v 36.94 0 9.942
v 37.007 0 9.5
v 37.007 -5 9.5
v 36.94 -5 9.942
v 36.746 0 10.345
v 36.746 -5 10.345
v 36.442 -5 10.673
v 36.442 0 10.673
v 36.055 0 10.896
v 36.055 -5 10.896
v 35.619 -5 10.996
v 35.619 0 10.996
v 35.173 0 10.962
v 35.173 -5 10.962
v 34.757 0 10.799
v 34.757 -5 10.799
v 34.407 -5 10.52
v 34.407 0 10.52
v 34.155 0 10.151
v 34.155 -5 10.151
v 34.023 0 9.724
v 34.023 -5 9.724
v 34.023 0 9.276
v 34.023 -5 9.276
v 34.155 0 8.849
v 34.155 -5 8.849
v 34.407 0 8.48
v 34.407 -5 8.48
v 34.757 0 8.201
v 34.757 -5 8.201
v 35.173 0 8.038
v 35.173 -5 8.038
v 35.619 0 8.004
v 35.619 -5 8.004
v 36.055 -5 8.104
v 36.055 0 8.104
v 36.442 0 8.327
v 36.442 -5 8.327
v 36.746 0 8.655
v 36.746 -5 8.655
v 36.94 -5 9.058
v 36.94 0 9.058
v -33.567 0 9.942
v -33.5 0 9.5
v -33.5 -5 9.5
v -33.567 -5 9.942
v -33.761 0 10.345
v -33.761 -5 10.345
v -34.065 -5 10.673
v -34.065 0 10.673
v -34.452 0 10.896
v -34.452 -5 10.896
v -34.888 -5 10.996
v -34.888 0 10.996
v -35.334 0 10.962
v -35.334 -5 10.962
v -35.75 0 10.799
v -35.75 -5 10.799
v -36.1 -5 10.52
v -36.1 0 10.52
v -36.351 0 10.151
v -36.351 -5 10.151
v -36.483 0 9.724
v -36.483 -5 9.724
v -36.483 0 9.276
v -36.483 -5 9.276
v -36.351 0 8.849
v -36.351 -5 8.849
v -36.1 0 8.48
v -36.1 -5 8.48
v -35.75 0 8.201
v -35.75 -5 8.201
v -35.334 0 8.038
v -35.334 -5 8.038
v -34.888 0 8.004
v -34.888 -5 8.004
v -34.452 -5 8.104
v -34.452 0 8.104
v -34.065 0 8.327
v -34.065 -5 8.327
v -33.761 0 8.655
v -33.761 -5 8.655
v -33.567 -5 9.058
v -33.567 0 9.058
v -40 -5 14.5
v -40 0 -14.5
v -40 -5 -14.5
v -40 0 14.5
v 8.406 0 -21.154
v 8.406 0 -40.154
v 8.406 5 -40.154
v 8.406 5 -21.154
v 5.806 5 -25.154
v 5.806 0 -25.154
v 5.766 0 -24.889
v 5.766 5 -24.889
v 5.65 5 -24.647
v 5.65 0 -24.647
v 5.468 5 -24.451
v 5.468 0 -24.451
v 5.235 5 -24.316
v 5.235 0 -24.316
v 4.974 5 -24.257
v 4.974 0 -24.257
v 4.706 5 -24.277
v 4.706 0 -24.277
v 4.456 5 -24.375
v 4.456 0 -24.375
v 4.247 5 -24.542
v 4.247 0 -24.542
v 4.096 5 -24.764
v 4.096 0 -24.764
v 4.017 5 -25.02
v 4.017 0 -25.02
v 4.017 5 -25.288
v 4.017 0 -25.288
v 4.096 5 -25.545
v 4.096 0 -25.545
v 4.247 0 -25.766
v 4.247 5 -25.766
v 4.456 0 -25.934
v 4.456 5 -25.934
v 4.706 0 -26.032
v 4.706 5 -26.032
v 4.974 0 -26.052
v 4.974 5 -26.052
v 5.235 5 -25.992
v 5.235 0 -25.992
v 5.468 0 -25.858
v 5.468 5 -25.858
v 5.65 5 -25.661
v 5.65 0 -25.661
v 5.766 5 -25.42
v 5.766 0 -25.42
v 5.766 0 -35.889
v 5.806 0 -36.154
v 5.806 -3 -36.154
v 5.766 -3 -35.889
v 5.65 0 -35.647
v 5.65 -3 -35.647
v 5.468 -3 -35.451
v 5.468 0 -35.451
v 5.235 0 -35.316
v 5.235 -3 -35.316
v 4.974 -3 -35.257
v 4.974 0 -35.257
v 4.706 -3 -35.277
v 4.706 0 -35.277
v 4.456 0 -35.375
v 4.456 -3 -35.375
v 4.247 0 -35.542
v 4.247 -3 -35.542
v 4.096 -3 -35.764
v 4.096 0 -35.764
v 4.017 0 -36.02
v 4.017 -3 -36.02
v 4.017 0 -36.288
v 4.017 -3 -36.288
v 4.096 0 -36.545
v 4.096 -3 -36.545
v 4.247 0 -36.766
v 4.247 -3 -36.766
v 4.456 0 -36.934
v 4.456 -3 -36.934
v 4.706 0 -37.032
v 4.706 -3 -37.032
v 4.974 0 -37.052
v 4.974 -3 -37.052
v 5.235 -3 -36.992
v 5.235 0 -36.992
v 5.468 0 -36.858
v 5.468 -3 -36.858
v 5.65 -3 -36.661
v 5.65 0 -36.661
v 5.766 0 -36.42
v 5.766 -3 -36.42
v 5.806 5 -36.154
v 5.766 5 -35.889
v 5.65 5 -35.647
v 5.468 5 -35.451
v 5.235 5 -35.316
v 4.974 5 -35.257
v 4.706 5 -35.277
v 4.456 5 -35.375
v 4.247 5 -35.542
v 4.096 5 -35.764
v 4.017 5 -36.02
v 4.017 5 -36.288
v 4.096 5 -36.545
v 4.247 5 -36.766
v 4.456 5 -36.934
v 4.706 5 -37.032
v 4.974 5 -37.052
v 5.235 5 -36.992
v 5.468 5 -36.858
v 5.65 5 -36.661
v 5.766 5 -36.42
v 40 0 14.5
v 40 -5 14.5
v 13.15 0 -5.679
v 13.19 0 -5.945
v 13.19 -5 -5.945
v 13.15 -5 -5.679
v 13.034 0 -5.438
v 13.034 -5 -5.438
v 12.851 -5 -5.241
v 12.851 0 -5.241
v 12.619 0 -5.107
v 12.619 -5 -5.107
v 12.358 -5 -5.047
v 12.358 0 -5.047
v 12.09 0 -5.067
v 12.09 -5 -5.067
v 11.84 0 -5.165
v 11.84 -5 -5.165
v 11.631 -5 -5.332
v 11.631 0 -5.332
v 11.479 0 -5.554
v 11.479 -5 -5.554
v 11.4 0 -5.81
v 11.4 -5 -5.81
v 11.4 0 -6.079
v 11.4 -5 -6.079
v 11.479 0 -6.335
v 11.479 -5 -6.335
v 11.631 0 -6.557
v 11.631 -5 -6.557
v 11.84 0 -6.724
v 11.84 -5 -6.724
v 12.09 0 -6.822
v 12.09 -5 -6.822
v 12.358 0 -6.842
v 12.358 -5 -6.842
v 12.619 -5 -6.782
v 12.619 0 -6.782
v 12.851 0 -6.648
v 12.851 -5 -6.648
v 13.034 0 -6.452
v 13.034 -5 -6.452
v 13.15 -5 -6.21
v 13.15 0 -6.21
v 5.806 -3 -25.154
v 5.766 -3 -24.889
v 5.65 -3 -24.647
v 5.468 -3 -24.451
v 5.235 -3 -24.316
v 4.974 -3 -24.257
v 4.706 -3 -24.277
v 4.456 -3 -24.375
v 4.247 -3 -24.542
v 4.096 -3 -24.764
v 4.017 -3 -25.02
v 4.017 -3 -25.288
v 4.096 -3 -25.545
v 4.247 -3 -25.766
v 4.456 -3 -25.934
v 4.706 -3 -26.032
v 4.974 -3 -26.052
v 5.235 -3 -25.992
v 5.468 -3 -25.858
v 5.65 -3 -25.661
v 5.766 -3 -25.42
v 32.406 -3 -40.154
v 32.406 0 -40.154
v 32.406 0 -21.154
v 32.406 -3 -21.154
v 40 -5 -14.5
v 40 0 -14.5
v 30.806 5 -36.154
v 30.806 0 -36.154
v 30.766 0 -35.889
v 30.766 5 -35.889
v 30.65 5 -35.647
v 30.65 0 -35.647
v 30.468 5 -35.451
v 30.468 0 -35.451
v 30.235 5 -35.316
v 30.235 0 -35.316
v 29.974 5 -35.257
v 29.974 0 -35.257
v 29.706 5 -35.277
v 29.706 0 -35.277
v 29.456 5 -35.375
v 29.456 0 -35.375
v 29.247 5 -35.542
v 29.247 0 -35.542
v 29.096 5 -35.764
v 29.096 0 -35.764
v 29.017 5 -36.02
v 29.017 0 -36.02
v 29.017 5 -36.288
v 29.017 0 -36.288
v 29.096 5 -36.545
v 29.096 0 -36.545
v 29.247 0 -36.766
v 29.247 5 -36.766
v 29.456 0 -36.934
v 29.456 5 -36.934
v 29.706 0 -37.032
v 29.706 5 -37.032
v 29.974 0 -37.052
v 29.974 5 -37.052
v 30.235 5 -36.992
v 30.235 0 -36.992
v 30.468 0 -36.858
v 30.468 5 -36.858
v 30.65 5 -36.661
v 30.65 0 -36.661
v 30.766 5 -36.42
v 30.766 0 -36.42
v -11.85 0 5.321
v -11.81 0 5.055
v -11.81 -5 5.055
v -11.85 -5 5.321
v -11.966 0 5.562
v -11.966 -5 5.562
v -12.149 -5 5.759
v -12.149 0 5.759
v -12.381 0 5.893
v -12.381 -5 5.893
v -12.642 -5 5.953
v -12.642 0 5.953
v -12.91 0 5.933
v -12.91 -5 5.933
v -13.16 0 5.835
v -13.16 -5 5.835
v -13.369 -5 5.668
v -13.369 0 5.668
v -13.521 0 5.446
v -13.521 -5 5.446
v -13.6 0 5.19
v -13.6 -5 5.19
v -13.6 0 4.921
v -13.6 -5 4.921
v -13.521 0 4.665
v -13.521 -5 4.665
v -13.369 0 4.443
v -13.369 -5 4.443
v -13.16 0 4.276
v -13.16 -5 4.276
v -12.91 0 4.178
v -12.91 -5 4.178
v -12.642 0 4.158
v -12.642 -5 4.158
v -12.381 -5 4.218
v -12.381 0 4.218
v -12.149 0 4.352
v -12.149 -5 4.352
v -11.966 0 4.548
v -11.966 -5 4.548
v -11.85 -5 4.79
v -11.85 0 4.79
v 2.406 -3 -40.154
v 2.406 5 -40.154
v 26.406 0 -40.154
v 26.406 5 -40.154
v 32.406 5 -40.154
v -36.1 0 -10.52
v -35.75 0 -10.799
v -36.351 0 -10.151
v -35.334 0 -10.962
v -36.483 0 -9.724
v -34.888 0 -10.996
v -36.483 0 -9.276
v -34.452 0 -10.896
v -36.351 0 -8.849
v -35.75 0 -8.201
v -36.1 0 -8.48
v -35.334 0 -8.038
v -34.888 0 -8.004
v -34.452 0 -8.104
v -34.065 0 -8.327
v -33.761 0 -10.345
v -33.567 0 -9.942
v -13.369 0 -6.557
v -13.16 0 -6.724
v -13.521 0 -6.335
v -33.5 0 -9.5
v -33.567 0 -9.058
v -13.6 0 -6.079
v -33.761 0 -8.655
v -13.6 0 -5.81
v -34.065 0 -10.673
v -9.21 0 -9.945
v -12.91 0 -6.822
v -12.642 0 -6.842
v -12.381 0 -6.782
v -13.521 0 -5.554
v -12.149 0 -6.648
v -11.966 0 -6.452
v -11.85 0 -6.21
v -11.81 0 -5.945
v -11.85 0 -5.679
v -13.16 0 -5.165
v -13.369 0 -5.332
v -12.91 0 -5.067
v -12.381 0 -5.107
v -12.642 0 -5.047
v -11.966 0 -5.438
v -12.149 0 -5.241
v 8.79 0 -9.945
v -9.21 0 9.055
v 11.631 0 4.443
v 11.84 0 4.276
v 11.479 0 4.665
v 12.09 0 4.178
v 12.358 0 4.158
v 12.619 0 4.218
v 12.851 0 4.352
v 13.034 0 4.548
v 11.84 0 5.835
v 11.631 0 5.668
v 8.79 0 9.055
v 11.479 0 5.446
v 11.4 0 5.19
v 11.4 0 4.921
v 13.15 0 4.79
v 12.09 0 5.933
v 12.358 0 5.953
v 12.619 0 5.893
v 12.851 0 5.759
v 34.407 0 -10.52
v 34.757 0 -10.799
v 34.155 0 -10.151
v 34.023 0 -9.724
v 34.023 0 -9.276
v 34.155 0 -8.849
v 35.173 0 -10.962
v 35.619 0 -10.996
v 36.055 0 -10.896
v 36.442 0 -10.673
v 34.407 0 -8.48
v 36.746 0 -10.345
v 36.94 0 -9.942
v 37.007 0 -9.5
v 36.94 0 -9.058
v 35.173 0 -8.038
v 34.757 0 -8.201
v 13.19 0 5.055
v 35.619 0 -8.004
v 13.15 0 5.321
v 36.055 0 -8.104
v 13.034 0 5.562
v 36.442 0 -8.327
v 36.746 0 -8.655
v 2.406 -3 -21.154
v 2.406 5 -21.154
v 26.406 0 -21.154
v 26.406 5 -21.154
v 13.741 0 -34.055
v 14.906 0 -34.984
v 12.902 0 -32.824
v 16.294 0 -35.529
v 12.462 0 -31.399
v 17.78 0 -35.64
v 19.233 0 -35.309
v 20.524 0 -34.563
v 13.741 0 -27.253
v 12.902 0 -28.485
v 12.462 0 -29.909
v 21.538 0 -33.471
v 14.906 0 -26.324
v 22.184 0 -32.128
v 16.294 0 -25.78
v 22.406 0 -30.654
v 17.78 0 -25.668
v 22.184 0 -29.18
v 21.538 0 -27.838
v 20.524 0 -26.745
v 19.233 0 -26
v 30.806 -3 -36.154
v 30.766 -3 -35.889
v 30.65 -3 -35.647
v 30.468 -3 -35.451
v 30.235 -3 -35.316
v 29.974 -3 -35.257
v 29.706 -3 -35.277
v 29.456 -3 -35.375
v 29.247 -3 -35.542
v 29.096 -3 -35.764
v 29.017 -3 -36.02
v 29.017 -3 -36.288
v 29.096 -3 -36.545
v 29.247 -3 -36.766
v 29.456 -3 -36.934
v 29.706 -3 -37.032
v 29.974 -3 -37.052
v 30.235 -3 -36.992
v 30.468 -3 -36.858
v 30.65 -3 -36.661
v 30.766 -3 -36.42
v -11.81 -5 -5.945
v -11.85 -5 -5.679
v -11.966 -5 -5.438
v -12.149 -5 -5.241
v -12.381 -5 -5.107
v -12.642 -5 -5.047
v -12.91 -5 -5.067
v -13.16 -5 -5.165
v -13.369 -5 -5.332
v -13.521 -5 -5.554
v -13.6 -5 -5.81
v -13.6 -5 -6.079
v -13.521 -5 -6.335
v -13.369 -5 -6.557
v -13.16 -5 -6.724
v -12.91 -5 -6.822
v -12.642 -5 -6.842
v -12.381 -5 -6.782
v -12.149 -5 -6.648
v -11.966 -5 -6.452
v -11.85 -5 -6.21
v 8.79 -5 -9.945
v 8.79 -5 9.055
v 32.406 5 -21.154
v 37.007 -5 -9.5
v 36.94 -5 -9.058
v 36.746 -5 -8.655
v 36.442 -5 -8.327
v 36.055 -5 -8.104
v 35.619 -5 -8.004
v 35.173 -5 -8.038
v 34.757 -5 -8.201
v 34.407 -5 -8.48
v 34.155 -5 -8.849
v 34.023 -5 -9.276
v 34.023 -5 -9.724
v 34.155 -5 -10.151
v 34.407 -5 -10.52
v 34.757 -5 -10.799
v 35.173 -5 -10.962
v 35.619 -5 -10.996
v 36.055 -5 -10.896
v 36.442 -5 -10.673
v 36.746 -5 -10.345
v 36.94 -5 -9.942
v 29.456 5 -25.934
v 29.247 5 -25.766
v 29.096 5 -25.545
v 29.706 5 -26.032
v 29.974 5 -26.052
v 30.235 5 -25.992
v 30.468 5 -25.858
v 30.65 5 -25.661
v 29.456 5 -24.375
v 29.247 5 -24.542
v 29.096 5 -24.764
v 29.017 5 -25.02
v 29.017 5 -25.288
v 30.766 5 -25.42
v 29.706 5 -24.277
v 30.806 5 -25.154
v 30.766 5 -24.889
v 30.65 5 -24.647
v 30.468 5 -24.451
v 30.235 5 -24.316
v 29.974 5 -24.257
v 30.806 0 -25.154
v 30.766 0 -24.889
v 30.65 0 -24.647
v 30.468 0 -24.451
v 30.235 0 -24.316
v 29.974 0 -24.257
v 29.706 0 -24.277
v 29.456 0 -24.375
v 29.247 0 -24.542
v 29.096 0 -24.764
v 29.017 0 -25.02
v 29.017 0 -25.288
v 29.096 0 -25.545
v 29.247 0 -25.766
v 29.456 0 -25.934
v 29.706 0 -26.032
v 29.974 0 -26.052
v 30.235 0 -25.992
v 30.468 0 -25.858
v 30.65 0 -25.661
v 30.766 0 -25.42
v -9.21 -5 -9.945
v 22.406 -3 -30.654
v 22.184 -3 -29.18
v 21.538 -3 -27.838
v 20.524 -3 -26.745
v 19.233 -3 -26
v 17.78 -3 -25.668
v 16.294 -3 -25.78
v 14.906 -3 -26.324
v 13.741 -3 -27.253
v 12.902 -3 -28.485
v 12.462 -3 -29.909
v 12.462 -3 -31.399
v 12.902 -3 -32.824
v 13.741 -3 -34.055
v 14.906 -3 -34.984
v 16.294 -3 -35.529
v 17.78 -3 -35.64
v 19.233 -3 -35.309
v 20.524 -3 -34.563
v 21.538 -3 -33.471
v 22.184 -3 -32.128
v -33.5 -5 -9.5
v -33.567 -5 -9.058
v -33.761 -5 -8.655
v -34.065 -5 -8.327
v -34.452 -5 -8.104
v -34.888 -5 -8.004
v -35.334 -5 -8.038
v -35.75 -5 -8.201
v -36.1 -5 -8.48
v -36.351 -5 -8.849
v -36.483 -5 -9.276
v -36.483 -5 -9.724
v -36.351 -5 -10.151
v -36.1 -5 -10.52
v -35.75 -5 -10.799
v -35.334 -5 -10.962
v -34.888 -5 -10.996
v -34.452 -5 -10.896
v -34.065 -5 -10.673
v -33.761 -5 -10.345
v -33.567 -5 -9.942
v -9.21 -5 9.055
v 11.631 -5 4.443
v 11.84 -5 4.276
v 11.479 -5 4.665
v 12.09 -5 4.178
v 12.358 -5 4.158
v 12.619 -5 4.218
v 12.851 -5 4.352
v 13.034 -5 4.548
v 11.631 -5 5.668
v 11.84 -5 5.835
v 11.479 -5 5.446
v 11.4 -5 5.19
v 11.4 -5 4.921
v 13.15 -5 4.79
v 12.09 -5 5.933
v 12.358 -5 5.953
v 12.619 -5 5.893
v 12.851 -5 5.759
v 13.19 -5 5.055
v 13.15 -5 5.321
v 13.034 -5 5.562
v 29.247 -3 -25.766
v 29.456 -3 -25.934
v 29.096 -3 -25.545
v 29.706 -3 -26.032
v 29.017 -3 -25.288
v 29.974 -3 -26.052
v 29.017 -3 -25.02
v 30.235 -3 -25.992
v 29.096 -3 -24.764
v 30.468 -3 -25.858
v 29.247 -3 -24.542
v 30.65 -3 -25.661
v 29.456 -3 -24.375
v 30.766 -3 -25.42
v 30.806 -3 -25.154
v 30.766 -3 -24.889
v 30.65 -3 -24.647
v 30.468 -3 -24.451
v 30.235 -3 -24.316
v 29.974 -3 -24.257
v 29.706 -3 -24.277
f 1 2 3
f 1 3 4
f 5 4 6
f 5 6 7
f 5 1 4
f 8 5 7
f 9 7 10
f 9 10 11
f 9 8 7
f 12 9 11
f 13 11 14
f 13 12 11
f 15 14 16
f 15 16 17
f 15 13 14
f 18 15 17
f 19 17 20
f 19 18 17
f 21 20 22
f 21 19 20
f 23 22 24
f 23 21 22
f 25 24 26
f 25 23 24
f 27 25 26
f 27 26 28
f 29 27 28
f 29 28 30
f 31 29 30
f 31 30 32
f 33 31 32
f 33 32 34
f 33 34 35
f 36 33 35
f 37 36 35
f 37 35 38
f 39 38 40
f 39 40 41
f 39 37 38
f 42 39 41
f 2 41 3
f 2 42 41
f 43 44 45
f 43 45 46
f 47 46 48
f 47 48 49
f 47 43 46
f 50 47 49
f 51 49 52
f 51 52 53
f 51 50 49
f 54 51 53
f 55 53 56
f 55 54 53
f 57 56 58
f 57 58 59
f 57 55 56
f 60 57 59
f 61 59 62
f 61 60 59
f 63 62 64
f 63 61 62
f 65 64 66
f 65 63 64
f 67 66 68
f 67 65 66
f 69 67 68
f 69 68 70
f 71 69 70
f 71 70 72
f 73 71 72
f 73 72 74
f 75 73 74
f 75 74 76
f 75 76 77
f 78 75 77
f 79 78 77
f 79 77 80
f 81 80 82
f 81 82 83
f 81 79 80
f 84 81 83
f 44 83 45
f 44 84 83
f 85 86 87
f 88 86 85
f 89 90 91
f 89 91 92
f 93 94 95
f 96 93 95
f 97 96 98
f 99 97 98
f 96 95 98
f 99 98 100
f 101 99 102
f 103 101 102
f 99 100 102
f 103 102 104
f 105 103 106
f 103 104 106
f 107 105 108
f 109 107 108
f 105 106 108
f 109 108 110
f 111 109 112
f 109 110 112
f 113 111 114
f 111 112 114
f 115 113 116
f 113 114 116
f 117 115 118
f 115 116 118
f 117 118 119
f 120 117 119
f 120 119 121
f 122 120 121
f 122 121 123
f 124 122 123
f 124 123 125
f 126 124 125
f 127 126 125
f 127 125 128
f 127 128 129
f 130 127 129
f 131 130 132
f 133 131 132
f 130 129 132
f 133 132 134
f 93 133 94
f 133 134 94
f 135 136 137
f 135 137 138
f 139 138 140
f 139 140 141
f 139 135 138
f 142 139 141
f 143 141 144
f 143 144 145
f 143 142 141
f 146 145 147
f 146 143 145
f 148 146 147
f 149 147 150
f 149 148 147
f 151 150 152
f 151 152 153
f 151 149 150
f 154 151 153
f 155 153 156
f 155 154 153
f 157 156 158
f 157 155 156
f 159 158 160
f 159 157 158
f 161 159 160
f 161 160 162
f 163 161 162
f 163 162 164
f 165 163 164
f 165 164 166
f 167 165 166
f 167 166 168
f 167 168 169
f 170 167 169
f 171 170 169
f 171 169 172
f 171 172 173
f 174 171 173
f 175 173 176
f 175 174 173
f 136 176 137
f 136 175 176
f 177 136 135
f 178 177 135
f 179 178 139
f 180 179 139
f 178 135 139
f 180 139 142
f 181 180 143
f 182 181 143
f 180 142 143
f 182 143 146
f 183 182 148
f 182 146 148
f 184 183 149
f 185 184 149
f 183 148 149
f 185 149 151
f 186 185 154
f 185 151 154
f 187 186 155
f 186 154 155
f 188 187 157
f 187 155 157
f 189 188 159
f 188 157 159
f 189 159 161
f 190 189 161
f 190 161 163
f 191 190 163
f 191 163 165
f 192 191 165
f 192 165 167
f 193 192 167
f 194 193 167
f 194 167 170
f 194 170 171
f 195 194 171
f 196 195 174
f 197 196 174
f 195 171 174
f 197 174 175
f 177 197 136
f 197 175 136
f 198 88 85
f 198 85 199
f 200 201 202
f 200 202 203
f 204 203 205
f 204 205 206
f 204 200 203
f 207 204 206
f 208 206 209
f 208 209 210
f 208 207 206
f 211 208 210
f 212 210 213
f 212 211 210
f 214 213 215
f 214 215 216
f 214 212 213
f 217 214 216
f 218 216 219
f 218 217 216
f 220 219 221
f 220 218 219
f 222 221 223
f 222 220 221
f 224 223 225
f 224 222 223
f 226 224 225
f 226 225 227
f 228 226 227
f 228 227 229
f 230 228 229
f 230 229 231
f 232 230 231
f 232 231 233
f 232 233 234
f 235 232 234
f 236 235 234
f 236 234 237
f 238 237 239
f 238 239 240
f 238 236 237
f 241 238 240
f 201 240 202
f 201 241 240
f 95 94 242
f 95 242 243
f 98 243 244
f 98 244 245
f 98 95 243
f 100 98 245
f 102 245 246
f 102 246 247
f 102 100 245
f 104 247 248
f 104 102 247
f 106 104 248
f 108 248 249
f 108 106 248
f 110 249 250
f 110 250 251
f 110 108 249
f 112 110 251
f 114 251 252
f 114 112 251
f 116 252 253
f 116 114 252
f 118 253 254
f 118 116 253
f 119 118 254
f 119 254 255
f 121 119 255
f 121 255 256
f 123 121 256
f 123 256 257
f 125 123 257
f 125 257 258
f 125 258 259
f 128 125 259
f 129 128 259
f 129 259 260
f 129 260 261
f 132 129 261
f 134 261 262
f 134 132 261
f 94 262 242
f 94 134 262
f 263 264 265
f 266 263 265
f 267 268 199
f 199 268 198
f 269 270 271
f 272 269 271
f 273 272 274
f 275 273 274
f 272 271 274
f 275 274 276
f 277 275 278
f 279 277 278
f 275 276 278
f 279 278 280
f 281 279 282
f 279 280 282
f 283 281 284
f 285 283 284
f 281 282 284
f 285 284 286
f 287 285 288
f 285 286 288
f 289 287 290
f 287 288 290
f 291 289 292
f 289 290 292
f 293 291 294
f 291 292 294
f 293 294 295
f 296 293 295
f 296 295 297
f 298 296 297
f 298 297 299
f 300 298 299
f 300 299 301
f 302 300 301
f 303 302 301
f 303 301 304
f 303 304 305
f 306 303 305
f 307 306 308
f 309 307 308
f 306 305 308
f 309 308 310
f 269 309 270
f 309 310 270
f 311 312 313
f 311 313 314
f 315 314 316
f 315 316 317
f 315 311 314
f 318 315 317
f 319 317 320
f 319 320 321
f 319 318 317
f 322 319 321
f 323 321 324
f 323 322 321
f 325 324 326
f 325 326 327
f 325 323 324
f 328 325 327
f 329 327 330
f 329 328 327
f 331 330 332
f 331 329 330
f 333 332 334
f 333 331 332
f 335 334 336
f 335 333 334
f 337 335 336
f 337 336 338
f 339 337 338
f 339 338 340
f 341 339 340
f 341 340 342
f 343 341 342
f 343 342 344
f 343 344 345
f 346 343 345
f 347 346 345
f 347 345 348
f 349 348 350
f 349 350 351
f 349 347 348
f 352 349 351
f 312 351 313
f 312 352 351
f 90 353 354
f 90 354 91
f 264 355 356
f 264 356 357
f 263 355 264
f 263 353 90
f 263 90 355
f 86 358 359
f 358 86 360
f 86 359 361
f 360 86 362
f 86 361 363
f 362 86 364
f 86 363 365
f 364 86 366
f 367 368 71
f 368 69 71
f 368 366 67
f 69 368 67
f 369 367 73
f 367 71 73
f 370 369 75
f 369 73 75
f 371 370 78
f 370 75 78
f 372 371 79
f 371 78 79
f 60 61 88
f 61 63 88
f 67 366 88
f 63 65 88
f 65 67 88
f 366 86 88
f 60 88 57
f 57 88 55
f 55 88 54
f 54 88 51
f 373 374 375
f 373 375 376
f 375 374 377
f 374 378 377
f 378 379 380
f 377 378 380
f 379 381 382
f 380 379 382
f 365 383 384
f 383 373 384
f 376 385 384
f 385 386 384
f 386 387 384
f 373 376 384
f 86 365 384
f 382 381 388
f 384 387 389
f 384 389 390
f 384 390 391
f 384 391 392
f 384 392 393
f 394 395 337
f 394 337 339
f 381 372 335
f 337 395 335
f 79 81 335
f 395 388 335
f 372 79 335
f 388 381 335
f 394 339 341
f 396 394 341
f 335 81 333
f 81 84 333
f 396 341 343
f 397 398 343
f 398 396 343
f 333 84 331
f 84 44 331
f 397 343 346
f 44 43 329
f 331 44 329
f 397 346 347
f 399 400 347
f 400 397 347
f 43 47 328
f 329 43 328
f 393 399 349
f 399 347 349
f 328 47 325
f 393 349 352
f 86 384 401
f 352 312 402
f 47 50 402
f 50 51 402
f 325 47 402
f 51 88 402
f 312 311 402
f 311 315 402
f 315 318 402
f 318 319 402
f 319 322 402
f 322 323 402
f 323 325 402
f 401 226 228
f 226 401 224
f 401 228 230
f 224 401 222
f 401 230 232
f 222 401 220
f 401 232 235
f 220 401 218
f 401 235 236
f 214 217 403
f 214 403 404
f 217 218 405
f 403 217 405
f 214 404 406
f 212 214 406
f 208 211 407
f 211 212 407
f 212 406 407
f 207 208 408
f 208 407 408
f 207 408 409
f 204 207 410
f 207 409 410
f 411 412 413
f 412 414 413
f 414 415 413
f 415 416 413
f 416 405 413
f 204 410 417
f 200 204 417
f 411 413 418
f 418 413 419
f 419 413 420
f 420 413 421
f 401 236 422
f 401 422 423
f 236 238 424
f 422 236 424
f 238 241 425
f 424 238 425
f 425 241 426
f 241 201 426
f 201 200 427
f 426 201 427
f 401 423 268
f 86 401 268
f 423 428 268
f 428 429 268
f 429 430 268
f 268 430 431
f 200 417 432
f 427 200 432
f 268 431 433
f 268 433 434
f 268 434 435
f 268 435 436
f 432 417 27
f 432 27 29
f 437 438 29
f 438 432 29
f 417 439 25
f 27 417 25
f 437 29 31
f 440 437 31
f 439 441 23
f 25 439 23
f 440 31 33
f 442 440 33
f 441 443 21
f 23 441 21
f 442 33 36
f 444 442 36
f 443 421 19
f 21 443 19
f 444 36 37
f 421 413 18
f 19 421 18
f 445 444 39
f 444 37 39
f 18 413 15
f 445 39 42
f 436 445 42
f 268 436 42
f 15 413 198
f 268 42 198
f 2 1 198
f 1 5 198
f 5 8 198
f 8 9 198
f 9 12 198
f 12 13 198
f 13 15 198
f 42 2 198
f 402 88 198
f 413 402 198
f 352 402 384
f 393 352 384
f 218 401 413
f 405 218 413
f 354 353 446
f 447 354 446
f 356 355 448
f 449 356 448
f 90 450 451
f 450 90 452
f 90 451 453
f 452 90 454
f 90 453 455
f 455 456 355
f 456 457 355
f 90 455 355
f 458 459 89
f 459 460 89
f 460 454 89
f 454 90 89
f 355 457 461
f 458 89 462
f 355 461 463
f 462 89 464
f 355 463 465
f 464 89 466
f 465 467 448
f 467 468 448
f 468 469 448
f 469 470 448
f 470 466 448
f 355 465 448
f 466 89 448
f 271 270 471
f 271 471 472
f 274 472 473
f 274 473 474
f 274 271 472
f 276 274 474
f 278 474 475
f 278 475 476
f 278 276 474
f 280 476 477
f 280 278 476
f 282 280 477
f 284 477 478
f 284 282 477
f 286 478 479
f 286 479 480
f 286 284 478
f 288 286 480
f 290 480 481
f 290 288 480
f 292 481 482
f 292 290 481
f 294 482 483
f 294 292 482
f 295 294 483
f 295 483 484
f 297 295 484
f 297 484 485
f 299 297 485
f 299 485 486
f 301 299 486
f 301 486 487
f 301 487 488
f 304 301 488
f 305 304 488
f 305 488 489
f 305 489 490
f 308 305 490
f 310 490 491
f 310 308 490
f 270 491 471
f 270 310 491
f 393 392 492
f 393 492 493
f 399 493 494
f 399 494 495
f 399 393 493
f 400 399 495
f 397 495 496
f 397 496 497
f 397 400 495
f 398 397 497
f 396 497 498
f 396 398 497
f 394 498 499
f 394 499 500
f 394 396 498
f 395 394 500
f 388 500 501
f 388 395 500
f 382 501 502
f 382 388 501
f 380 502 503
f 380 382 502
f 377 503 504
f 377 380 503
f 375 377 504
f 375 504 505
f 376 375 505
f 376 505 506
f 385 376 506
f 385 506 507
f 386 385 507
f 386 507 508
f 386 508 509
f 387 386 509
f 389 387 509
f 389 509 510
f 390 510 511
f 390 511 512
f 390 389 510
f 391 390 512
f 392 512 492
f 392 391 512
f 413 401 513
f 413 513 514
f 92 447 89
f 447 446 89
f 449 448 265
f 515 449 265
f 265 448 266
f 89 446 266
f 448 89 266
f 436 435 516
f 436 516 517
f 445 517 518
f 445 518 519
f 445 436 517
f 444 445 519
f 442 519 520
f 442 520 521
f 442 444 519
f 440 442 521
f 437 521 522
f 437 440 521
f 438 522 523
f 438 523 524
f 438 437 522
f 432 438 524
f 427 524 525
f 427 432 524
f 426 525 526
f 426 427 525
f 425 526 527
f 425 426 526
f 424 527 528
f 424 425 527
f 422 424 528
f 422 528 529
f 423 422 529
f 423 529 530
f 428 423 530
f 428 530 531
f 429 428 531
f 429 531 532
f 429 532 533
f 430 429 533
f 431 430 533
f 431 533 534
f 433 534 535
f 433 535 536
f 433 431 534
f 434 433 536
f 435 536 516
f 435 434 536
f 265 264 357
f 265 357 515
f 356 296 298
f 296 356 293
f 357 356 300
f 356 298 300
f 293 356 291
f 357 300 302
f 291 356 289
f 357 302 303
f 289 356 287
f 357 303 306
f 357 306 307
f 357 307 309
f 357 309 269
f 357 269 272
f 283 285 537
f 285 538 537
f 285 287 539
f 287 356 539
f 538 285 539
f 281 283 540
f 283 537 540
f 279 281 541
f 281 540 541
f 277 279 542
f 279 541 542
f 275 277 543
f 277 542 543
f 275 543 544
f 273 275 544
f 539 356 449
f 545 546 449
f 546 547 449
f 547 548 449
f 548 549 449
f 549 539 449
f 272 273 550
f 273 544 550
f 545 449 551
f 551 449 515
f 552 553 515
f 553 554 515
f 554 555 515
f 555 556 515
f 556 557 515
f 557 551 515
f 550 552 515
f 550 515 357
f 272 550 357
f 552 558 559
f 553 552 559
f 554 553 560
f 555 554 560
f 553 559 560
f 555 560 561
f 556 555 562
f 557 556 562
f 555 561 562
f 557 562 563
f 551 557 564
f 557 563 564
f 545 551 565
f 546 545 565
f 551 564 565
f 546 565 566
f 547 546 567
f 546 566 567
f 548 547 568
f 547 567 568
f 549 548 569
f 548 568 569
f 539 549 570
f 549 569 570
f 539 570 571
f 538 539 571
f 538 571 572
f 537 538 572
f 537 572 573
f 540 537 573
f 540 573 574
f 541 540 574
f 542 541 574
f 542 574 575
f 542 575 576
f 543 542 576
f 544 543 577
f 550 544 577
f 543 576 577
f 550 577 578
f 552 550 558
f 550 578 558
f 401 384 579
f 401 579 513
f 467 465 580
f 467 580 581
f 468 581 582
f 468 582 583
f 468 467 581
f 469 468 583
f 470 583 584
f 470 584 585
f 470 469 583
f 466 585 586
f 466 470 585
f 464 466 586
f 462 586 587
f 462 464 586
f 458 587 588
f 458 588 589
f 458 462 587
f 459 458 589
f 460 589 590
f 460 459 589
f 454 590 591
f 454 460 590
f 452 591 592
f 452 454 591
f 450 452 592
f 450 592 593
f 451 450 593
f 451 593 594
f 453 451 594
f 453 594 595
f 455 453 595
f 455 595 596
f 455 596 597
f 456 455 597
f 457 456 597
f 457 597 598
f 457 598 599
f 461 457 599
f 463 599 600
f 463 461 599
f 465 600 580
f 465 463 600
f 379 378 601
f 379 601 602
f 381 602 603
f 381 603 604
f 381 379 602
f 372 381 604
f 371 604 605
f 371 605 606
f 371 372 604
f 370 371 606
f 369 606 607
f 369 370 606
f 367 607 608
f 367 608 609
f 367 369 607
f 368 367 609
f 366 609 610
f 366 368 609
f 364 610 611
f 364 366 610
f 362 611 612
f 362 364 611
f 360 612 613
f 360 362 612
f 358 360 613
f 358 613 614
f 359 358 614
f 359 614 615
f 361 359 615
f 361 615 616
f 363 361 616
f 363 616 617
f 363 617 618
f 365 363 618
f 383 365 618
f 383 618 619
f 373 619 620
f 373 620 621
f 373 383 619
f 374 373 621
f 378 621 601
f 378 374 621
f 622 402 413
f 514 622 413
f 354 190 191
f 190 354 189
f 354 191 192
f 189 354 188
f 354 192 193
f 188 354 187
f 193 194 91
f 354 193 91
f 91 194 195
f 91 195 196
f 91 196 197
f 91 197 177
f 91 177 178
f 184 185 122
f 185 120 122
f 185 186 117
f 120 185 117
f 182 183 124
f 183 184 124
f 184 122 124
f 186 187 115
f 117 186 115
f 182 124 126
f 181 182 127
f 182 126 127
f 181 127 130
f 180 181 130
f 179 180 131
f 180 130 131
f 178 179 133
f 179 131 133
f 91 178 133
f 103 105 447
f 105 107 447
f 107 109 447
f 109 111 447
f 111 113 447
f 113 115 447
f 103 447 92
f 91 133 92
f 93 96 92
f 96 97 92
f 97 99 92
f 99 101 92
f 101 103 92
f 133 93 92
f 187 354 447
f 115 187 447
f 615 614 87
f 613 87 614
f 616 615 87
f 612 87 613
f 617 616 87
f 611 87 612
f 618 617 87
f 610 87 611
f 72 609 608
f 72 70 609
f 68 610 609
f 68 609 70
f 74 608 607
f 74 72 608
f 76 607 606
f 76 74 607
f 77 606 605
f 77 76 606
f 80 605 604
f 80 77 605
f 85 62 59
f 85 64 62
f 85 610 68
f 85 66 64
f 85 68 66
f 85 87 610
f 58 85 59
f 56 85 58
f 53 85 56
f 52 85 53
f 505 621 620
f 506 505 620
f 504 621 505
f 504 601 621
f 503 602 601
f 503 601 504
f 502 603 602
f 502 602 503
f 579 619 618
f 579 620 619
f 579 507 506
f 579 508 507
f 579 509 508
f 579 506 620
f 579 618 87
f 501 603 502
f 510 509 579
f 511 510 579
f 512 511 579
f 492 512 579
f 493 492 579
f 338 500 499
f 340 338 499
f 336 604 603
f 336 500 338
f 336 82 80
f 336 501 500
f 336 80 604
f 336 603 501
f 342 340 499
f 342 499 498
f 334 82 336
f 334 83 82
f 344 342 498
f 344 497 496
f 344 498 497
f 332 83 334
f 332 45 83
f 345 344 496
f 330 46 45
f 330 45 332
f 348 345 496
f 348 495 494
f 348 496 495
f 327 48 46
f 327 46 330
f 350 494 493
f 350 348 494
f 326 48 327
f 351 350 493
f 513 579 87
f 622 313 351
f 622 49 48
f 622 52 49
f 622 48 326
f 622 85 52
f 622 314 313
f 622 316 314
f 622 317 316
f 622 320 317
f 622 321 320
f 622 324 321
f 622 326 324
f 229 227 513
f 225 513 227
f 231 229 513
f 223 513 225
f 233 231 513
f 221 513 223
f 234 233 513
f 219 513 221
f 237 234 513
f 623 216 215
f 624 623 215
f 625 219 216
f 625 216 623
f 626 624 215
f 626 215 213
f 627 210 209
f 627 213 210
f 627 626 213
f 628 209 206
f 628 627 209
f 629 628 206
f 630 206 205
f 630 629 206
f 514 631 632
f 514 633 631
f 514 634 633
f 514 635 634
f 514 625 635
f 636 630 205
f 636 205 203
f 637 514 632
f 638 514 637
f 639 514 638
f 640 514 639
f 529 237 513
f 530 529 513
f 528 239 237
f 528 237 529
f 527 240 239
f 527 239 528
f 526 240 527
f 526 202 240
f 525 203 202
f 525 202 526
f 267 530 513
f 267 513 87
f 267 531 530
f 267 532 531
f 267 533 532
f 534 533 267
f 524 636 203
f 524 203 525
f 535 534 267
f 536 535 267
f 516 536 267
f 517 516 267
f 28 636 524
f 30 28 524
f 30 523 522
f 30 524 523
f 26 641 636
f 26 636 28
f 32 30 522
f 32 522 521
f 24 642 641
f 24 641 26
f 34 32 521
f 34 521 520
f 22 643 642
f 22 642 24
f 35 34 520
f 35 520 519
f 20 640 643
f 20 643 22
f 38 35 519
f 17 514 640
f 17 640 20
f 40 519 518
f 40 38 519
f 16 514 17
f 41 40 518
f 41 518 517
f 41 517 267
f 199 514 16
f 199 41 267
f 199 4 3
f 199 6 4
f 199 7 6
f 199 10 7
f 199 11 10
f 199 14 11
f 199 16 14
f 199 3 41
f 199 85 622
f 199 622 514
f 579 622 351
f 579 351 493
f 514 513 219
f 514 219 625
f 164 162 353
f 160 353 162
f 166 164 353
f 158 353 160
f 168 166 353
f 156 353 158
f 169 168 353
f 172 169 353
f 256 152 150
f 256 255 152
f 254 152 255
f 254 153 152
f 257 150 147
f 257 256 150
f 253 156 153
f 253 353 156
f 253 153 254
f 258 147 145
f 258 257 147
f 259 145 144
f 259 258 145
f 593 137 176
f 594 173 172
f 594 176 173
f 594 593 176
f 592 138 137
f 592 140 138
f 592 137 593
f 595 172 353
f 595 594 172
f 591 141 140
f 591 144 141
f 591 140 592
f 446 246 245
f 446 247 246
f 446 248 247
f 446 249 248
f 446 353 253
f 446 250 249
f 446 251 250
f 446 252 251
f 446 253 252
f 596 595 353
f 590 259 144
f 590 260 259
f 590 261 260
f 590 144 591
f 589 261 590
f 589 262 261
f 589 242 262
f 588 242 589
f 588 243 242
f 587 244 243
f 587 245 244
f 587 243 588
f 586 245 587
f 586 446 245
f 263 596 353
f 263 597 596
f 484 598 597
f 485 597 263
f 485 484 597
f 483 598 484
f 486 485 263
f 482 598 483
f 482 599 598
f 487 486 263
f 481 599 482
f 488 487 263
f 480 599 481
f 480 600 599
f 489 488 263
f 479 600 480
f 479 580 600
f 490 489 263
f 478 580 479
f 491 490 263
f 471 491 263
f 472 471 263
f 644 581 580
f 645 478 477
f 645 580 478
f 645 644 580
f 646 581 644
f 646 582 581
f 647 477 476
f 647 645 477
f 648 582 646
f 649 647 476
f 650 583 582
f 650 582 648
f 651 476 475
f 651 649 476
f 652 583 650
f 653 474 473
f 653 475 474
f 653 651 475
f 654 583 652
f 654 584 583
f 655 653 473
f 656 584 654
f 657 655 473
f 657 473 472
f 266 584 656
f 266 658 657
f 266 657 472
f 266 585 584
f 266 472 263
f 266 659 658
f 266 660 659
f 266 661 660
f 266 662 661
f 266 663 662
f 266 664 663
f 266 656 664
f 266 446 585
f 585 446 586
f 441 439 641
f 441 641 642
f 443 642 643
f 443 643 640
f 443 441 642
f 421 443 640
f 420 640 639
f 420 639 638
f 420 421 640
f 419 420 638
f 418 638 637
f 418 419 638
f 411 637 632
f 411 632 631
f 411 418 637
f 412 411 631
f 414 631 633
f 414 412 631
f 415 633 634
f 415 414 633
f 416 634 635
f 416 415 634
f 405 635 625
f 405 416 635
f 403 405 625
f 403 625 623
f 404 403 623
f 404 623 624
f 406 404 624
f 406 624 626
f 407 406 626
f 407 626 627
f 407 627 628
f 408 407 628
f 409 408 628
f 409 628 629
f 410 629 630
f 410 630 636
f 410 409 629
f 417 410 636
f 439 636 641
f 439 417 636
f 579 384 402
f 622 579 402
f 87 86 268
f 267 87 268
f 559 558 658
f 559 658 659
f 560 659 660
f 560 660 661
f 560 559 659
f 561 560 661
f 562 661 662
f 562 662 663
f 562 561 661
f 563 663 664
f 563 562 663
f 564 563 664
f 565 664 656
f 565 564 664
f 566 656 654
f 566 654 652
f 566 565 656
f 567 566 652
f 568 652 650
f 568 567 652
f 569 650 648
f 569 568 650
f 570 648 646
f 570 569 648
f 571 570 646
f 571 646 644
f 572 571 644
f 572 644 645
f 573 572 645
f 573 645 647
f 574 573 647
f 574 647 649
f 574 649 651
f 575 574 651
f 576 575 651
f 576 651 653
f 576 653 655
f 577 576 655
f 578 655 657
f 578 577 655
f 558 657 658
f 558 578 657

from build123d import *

# Parameters (mm, degrees)
F0_W     = 80
F0_H     = 29
F0_R     = 1.5
F0_R_2   = 0.9
F0_W_2   = 18
F0_H_2   = 19
F1_DEPTH = 5
F2_W     = 18
F2_H     = 19
F2_R     = 5
F2_W_2   = 6
F2_R_2   = 0.9
F3_DEPTH = 3
F4_DEPTH = 5


with BuildPart() as f1:
    # F0 (on Front) → F1 (new body)
    with BuildSketch(Plane.XZ):
        Rectangle(F0_W, F0_H)
        with Locations((-35, -9.5)):
            Circle(F0_R, mode=Mode.SUBTRACT)
        with Locations((-12.70968, -5.944636)):
            Circle(F0_R_2, mode=Mode.SUBTRACT)
        with Locations((-0.20968, -0.444636)):
            Rectangle(F0_W_2, F0_H_2, mode=Mode.SUBTRACT)
        with Locations((35.506628, -9.5)):
            Circle(F0_R, mode=Mode.SUBTRACT)
        with Locations((12.29032, -5.944636)):
            Circle(F0_R_2, mode=Mode.SUBTRACT)
        with Locations((-12.70968, 5.055364)):
            Circle(F0_R_2, mode=Mode.SUBTRACT)
        with Locations((-35, 9.5)):
            Circle(F0_R, mode=Mode.SUBTRACT)
        with Locations((12.29032, 5.055364)):
            Circle(F0_R_2, mode=Mode.SUBTRACT)
        with Locations((35.506628, 9.5)):
            Circle(F0_R, mode=Mode.SUBTRACT)
    extrude(amount=F1_DEPTH)


with BuildPart() as f3:
    # F2 (on Front) → F3 (new body)
    with BuildSketch(Plane.XZ):
        with Locations((17.406479, -30.654245)):
            Rectangle(F2_W, F2_H)
        with Locations((17.406479, -30.654245)):
            Circle(F2_R, mode=Mode.SUBTRACT)
        with Locations((5.406479, -30.654245)):
            Rectangle(F2_W_2, F2_H)
        with Locations((4.906479, -36.154245)):
            Circle(F2_R_2, mode=Mode.SUBTRACT)
        with Locations((4.906479, -25.154245)):
            Circle(F2_R_2, mode=Mode.SUBTRACT)
        with Locations((29.406479, -30.654245)):
            Rectangle(F2_W_2, F2_H)
        with Locations((29.906479, -36.154245)):
            Circle(F2_R_2, mode=Mode.SUBTRACT)
        with Locations((29.906479, -25.154245)):
            Circle(F2_R_2, mode=Mode.SUBTRACT)
    extrude(amount=F3_DEPTH)

    # F2 (on Front) → F4 (join)
    with BuildSketch(Plane.XZ):
        with Locations((5.406479, -30.654245)):
            Rectangle(F2_W_2, F2_H)
        with Locations((4.906479, -36.154245)):
            Circle(F2_R_2, mode=Mode.SUBTRACT)
        with Locations((4.906479, -25.154245)):
            Circle(F2_R_2, mode=Mode.SUBTRACT)
        with Locations((29.406479, -30.654245)):
            Rectangle(F2_W_2, F2_H)
        with Locations((29.906479, -36.154245)):
            Circle(F2_R_2, mode=Mode.SUBTRACT)
        with Locations((29.906479, -25.154245)):
            Circle(F2_R_2, mode=Mode.SUBTRACT)
    extrude(amount=-F4_DEPTH)


solid = Compound([f1.part, f3.part])
